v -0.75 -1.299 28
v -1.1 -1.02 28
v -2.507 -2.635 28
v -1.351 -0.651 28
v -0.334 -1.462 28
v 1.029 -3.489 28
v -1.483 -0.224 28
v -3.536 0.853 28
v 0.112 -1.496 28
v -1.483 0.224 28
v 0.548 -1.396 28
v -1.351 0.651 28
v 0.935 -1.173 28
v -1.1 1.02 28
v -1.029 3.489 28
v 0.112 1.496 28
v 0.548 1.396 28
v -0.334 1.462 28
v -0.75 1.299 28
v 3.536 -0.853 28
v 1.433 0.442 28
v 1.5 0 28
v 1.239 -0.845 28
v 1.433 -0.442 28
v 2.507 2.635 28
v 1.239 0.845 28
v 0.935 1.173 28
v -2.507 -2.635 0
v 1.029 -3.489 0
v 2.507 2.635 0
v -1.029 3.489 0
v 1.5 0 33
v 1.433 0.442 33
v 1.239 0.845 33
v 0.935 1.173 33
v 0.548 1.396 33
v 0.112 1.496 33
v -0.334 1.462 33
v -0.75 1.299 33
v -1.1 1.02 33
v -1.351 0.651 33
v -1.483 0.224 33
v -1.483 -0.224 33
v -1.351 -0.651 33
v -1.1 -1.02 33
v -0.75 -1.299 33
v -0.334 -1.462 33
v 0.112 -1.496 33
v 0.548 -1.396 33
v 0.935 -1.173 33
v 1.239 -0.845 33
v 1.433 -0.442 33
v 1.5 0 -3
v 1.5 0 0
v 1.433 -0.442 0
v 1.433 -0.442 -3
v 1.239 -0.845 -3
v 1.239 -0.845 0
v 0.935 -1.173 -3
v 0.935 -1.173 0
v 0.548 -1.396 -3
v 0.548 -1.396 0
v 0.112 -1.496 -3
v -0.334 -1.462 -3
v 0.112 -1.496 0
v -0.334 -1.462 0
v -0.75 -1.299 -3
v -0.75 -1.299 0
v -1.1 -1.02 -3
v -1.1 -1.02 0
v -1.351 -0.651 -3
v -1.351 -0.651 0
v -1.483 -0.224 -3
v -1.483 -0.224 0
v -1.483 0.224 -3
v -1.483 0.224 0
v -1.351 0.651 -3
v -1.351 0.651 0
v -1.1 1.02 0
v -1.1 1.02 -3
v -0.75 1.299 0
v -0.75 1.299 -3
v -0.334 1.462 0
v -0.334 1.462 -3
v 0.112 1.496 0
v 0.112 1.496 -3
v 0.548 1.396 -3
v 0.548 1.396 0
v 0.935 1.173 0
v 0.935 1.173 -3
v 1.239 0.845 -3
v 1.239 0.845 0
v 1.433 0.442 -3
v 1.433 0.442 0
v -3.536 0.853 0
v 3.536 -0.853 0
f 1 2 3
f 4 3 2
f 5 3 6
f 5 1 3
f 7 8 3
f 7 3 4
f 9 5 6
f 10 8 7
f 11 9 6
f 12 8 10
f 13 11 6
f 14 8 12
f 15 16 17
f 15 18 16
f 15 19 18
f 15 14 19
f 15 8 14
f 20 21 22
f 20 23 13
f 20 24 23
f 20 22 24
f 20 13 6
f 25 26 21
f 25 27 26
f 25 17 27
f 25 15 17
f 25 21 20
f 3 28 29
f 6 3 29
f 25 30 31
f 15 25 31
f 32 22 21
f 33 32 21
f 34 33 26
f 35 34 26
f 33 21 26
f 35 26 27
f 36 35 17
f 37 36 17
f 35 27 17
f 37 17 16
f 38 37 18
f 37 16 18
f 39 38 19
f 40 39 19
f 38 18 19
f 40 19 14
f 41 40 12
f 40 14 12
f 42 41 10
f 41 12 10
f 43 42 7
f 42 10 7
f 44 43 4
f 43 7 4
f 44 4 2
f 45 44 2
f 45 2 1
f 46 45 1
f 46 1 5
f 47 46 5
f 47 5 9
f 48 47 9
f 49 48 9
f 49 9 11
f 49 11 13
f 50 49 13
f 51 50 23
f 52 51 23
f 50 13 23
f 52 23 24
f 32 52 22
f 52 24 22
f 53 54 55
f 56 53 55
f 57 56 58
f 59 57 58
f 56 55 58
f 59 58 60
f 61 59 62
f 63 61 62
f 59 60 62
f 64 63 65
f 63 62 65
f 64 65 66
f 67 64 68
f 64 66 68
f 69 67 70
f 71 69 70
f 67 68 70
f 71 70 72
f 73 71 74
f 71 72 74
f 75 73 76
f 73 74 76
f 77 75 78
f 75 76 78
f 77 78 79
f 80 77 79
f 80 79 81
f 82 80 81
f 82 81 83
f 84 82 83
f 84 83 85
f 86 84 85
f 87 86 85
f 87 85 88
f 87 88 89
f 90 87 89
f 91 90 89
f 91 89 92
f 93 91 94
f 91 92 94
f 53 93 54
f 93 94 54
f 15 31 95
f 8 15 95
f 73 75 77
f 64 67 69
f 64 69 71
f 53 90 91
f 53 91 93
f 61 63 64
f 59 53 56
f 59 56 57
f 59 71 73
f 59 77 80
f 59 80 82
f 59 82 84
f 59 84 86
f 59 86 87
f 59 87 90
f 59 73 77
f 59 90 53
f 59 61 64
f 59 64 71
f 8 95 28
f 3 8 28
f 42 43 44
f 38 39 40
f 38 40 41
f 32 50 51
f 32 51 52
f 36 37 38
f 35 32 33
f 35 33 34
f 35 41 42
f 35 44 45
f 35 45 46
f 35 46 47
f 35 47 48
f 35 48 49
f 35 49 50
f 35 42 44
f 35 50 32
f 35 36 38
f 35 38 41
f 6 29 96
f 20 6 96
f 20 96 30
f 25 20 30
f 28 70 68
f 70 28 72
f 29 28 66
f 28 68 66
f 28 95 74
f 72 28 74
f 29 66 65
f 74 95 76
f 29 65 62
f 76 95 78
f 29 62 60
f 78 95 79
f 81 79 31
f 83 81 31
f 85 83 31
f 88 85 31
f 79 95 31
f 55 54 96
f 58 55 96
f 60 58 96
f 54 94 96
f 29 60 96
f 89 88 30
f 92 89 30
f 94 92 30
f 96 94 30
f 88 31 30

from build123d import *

# Parameters (mm, degrees)
F1_DEPTH = 28
F2_R     = 1.5
F3_DEPTH = 5
F4_R     = 1.5
F5_DEPTH = 3


with BuildPart() as f1:
    # F0 (on Top) → F1 (new body)
    with BuildSketch(Plane.XY):
        Polygon((-1.028917, 3.488743), (-3.535799, 0.853303), (-2.506882, -2.63544), (1.028917, -3.488743), (3.535799, -0.853303), (2.506882, 2.63544), align=None)
    extrude(amount=F1_DEPTH)

    # F2 (on face) → F3 (join)
    with BuildSketch(Plane.XY.offset(28)):
        Circle(F2_R)
    extrude(amount=F3_DEPTH)

    # F4 (on face) → F5 (join)
    with BuildSketch(Plane(origin=(0, 0, 0), x_dir=(1, 0, 0), z_dir=(0, 0, -1))):
        Circle(F4_R)
    extrude(amount=F5_DEPTH)


solid = f1.part
